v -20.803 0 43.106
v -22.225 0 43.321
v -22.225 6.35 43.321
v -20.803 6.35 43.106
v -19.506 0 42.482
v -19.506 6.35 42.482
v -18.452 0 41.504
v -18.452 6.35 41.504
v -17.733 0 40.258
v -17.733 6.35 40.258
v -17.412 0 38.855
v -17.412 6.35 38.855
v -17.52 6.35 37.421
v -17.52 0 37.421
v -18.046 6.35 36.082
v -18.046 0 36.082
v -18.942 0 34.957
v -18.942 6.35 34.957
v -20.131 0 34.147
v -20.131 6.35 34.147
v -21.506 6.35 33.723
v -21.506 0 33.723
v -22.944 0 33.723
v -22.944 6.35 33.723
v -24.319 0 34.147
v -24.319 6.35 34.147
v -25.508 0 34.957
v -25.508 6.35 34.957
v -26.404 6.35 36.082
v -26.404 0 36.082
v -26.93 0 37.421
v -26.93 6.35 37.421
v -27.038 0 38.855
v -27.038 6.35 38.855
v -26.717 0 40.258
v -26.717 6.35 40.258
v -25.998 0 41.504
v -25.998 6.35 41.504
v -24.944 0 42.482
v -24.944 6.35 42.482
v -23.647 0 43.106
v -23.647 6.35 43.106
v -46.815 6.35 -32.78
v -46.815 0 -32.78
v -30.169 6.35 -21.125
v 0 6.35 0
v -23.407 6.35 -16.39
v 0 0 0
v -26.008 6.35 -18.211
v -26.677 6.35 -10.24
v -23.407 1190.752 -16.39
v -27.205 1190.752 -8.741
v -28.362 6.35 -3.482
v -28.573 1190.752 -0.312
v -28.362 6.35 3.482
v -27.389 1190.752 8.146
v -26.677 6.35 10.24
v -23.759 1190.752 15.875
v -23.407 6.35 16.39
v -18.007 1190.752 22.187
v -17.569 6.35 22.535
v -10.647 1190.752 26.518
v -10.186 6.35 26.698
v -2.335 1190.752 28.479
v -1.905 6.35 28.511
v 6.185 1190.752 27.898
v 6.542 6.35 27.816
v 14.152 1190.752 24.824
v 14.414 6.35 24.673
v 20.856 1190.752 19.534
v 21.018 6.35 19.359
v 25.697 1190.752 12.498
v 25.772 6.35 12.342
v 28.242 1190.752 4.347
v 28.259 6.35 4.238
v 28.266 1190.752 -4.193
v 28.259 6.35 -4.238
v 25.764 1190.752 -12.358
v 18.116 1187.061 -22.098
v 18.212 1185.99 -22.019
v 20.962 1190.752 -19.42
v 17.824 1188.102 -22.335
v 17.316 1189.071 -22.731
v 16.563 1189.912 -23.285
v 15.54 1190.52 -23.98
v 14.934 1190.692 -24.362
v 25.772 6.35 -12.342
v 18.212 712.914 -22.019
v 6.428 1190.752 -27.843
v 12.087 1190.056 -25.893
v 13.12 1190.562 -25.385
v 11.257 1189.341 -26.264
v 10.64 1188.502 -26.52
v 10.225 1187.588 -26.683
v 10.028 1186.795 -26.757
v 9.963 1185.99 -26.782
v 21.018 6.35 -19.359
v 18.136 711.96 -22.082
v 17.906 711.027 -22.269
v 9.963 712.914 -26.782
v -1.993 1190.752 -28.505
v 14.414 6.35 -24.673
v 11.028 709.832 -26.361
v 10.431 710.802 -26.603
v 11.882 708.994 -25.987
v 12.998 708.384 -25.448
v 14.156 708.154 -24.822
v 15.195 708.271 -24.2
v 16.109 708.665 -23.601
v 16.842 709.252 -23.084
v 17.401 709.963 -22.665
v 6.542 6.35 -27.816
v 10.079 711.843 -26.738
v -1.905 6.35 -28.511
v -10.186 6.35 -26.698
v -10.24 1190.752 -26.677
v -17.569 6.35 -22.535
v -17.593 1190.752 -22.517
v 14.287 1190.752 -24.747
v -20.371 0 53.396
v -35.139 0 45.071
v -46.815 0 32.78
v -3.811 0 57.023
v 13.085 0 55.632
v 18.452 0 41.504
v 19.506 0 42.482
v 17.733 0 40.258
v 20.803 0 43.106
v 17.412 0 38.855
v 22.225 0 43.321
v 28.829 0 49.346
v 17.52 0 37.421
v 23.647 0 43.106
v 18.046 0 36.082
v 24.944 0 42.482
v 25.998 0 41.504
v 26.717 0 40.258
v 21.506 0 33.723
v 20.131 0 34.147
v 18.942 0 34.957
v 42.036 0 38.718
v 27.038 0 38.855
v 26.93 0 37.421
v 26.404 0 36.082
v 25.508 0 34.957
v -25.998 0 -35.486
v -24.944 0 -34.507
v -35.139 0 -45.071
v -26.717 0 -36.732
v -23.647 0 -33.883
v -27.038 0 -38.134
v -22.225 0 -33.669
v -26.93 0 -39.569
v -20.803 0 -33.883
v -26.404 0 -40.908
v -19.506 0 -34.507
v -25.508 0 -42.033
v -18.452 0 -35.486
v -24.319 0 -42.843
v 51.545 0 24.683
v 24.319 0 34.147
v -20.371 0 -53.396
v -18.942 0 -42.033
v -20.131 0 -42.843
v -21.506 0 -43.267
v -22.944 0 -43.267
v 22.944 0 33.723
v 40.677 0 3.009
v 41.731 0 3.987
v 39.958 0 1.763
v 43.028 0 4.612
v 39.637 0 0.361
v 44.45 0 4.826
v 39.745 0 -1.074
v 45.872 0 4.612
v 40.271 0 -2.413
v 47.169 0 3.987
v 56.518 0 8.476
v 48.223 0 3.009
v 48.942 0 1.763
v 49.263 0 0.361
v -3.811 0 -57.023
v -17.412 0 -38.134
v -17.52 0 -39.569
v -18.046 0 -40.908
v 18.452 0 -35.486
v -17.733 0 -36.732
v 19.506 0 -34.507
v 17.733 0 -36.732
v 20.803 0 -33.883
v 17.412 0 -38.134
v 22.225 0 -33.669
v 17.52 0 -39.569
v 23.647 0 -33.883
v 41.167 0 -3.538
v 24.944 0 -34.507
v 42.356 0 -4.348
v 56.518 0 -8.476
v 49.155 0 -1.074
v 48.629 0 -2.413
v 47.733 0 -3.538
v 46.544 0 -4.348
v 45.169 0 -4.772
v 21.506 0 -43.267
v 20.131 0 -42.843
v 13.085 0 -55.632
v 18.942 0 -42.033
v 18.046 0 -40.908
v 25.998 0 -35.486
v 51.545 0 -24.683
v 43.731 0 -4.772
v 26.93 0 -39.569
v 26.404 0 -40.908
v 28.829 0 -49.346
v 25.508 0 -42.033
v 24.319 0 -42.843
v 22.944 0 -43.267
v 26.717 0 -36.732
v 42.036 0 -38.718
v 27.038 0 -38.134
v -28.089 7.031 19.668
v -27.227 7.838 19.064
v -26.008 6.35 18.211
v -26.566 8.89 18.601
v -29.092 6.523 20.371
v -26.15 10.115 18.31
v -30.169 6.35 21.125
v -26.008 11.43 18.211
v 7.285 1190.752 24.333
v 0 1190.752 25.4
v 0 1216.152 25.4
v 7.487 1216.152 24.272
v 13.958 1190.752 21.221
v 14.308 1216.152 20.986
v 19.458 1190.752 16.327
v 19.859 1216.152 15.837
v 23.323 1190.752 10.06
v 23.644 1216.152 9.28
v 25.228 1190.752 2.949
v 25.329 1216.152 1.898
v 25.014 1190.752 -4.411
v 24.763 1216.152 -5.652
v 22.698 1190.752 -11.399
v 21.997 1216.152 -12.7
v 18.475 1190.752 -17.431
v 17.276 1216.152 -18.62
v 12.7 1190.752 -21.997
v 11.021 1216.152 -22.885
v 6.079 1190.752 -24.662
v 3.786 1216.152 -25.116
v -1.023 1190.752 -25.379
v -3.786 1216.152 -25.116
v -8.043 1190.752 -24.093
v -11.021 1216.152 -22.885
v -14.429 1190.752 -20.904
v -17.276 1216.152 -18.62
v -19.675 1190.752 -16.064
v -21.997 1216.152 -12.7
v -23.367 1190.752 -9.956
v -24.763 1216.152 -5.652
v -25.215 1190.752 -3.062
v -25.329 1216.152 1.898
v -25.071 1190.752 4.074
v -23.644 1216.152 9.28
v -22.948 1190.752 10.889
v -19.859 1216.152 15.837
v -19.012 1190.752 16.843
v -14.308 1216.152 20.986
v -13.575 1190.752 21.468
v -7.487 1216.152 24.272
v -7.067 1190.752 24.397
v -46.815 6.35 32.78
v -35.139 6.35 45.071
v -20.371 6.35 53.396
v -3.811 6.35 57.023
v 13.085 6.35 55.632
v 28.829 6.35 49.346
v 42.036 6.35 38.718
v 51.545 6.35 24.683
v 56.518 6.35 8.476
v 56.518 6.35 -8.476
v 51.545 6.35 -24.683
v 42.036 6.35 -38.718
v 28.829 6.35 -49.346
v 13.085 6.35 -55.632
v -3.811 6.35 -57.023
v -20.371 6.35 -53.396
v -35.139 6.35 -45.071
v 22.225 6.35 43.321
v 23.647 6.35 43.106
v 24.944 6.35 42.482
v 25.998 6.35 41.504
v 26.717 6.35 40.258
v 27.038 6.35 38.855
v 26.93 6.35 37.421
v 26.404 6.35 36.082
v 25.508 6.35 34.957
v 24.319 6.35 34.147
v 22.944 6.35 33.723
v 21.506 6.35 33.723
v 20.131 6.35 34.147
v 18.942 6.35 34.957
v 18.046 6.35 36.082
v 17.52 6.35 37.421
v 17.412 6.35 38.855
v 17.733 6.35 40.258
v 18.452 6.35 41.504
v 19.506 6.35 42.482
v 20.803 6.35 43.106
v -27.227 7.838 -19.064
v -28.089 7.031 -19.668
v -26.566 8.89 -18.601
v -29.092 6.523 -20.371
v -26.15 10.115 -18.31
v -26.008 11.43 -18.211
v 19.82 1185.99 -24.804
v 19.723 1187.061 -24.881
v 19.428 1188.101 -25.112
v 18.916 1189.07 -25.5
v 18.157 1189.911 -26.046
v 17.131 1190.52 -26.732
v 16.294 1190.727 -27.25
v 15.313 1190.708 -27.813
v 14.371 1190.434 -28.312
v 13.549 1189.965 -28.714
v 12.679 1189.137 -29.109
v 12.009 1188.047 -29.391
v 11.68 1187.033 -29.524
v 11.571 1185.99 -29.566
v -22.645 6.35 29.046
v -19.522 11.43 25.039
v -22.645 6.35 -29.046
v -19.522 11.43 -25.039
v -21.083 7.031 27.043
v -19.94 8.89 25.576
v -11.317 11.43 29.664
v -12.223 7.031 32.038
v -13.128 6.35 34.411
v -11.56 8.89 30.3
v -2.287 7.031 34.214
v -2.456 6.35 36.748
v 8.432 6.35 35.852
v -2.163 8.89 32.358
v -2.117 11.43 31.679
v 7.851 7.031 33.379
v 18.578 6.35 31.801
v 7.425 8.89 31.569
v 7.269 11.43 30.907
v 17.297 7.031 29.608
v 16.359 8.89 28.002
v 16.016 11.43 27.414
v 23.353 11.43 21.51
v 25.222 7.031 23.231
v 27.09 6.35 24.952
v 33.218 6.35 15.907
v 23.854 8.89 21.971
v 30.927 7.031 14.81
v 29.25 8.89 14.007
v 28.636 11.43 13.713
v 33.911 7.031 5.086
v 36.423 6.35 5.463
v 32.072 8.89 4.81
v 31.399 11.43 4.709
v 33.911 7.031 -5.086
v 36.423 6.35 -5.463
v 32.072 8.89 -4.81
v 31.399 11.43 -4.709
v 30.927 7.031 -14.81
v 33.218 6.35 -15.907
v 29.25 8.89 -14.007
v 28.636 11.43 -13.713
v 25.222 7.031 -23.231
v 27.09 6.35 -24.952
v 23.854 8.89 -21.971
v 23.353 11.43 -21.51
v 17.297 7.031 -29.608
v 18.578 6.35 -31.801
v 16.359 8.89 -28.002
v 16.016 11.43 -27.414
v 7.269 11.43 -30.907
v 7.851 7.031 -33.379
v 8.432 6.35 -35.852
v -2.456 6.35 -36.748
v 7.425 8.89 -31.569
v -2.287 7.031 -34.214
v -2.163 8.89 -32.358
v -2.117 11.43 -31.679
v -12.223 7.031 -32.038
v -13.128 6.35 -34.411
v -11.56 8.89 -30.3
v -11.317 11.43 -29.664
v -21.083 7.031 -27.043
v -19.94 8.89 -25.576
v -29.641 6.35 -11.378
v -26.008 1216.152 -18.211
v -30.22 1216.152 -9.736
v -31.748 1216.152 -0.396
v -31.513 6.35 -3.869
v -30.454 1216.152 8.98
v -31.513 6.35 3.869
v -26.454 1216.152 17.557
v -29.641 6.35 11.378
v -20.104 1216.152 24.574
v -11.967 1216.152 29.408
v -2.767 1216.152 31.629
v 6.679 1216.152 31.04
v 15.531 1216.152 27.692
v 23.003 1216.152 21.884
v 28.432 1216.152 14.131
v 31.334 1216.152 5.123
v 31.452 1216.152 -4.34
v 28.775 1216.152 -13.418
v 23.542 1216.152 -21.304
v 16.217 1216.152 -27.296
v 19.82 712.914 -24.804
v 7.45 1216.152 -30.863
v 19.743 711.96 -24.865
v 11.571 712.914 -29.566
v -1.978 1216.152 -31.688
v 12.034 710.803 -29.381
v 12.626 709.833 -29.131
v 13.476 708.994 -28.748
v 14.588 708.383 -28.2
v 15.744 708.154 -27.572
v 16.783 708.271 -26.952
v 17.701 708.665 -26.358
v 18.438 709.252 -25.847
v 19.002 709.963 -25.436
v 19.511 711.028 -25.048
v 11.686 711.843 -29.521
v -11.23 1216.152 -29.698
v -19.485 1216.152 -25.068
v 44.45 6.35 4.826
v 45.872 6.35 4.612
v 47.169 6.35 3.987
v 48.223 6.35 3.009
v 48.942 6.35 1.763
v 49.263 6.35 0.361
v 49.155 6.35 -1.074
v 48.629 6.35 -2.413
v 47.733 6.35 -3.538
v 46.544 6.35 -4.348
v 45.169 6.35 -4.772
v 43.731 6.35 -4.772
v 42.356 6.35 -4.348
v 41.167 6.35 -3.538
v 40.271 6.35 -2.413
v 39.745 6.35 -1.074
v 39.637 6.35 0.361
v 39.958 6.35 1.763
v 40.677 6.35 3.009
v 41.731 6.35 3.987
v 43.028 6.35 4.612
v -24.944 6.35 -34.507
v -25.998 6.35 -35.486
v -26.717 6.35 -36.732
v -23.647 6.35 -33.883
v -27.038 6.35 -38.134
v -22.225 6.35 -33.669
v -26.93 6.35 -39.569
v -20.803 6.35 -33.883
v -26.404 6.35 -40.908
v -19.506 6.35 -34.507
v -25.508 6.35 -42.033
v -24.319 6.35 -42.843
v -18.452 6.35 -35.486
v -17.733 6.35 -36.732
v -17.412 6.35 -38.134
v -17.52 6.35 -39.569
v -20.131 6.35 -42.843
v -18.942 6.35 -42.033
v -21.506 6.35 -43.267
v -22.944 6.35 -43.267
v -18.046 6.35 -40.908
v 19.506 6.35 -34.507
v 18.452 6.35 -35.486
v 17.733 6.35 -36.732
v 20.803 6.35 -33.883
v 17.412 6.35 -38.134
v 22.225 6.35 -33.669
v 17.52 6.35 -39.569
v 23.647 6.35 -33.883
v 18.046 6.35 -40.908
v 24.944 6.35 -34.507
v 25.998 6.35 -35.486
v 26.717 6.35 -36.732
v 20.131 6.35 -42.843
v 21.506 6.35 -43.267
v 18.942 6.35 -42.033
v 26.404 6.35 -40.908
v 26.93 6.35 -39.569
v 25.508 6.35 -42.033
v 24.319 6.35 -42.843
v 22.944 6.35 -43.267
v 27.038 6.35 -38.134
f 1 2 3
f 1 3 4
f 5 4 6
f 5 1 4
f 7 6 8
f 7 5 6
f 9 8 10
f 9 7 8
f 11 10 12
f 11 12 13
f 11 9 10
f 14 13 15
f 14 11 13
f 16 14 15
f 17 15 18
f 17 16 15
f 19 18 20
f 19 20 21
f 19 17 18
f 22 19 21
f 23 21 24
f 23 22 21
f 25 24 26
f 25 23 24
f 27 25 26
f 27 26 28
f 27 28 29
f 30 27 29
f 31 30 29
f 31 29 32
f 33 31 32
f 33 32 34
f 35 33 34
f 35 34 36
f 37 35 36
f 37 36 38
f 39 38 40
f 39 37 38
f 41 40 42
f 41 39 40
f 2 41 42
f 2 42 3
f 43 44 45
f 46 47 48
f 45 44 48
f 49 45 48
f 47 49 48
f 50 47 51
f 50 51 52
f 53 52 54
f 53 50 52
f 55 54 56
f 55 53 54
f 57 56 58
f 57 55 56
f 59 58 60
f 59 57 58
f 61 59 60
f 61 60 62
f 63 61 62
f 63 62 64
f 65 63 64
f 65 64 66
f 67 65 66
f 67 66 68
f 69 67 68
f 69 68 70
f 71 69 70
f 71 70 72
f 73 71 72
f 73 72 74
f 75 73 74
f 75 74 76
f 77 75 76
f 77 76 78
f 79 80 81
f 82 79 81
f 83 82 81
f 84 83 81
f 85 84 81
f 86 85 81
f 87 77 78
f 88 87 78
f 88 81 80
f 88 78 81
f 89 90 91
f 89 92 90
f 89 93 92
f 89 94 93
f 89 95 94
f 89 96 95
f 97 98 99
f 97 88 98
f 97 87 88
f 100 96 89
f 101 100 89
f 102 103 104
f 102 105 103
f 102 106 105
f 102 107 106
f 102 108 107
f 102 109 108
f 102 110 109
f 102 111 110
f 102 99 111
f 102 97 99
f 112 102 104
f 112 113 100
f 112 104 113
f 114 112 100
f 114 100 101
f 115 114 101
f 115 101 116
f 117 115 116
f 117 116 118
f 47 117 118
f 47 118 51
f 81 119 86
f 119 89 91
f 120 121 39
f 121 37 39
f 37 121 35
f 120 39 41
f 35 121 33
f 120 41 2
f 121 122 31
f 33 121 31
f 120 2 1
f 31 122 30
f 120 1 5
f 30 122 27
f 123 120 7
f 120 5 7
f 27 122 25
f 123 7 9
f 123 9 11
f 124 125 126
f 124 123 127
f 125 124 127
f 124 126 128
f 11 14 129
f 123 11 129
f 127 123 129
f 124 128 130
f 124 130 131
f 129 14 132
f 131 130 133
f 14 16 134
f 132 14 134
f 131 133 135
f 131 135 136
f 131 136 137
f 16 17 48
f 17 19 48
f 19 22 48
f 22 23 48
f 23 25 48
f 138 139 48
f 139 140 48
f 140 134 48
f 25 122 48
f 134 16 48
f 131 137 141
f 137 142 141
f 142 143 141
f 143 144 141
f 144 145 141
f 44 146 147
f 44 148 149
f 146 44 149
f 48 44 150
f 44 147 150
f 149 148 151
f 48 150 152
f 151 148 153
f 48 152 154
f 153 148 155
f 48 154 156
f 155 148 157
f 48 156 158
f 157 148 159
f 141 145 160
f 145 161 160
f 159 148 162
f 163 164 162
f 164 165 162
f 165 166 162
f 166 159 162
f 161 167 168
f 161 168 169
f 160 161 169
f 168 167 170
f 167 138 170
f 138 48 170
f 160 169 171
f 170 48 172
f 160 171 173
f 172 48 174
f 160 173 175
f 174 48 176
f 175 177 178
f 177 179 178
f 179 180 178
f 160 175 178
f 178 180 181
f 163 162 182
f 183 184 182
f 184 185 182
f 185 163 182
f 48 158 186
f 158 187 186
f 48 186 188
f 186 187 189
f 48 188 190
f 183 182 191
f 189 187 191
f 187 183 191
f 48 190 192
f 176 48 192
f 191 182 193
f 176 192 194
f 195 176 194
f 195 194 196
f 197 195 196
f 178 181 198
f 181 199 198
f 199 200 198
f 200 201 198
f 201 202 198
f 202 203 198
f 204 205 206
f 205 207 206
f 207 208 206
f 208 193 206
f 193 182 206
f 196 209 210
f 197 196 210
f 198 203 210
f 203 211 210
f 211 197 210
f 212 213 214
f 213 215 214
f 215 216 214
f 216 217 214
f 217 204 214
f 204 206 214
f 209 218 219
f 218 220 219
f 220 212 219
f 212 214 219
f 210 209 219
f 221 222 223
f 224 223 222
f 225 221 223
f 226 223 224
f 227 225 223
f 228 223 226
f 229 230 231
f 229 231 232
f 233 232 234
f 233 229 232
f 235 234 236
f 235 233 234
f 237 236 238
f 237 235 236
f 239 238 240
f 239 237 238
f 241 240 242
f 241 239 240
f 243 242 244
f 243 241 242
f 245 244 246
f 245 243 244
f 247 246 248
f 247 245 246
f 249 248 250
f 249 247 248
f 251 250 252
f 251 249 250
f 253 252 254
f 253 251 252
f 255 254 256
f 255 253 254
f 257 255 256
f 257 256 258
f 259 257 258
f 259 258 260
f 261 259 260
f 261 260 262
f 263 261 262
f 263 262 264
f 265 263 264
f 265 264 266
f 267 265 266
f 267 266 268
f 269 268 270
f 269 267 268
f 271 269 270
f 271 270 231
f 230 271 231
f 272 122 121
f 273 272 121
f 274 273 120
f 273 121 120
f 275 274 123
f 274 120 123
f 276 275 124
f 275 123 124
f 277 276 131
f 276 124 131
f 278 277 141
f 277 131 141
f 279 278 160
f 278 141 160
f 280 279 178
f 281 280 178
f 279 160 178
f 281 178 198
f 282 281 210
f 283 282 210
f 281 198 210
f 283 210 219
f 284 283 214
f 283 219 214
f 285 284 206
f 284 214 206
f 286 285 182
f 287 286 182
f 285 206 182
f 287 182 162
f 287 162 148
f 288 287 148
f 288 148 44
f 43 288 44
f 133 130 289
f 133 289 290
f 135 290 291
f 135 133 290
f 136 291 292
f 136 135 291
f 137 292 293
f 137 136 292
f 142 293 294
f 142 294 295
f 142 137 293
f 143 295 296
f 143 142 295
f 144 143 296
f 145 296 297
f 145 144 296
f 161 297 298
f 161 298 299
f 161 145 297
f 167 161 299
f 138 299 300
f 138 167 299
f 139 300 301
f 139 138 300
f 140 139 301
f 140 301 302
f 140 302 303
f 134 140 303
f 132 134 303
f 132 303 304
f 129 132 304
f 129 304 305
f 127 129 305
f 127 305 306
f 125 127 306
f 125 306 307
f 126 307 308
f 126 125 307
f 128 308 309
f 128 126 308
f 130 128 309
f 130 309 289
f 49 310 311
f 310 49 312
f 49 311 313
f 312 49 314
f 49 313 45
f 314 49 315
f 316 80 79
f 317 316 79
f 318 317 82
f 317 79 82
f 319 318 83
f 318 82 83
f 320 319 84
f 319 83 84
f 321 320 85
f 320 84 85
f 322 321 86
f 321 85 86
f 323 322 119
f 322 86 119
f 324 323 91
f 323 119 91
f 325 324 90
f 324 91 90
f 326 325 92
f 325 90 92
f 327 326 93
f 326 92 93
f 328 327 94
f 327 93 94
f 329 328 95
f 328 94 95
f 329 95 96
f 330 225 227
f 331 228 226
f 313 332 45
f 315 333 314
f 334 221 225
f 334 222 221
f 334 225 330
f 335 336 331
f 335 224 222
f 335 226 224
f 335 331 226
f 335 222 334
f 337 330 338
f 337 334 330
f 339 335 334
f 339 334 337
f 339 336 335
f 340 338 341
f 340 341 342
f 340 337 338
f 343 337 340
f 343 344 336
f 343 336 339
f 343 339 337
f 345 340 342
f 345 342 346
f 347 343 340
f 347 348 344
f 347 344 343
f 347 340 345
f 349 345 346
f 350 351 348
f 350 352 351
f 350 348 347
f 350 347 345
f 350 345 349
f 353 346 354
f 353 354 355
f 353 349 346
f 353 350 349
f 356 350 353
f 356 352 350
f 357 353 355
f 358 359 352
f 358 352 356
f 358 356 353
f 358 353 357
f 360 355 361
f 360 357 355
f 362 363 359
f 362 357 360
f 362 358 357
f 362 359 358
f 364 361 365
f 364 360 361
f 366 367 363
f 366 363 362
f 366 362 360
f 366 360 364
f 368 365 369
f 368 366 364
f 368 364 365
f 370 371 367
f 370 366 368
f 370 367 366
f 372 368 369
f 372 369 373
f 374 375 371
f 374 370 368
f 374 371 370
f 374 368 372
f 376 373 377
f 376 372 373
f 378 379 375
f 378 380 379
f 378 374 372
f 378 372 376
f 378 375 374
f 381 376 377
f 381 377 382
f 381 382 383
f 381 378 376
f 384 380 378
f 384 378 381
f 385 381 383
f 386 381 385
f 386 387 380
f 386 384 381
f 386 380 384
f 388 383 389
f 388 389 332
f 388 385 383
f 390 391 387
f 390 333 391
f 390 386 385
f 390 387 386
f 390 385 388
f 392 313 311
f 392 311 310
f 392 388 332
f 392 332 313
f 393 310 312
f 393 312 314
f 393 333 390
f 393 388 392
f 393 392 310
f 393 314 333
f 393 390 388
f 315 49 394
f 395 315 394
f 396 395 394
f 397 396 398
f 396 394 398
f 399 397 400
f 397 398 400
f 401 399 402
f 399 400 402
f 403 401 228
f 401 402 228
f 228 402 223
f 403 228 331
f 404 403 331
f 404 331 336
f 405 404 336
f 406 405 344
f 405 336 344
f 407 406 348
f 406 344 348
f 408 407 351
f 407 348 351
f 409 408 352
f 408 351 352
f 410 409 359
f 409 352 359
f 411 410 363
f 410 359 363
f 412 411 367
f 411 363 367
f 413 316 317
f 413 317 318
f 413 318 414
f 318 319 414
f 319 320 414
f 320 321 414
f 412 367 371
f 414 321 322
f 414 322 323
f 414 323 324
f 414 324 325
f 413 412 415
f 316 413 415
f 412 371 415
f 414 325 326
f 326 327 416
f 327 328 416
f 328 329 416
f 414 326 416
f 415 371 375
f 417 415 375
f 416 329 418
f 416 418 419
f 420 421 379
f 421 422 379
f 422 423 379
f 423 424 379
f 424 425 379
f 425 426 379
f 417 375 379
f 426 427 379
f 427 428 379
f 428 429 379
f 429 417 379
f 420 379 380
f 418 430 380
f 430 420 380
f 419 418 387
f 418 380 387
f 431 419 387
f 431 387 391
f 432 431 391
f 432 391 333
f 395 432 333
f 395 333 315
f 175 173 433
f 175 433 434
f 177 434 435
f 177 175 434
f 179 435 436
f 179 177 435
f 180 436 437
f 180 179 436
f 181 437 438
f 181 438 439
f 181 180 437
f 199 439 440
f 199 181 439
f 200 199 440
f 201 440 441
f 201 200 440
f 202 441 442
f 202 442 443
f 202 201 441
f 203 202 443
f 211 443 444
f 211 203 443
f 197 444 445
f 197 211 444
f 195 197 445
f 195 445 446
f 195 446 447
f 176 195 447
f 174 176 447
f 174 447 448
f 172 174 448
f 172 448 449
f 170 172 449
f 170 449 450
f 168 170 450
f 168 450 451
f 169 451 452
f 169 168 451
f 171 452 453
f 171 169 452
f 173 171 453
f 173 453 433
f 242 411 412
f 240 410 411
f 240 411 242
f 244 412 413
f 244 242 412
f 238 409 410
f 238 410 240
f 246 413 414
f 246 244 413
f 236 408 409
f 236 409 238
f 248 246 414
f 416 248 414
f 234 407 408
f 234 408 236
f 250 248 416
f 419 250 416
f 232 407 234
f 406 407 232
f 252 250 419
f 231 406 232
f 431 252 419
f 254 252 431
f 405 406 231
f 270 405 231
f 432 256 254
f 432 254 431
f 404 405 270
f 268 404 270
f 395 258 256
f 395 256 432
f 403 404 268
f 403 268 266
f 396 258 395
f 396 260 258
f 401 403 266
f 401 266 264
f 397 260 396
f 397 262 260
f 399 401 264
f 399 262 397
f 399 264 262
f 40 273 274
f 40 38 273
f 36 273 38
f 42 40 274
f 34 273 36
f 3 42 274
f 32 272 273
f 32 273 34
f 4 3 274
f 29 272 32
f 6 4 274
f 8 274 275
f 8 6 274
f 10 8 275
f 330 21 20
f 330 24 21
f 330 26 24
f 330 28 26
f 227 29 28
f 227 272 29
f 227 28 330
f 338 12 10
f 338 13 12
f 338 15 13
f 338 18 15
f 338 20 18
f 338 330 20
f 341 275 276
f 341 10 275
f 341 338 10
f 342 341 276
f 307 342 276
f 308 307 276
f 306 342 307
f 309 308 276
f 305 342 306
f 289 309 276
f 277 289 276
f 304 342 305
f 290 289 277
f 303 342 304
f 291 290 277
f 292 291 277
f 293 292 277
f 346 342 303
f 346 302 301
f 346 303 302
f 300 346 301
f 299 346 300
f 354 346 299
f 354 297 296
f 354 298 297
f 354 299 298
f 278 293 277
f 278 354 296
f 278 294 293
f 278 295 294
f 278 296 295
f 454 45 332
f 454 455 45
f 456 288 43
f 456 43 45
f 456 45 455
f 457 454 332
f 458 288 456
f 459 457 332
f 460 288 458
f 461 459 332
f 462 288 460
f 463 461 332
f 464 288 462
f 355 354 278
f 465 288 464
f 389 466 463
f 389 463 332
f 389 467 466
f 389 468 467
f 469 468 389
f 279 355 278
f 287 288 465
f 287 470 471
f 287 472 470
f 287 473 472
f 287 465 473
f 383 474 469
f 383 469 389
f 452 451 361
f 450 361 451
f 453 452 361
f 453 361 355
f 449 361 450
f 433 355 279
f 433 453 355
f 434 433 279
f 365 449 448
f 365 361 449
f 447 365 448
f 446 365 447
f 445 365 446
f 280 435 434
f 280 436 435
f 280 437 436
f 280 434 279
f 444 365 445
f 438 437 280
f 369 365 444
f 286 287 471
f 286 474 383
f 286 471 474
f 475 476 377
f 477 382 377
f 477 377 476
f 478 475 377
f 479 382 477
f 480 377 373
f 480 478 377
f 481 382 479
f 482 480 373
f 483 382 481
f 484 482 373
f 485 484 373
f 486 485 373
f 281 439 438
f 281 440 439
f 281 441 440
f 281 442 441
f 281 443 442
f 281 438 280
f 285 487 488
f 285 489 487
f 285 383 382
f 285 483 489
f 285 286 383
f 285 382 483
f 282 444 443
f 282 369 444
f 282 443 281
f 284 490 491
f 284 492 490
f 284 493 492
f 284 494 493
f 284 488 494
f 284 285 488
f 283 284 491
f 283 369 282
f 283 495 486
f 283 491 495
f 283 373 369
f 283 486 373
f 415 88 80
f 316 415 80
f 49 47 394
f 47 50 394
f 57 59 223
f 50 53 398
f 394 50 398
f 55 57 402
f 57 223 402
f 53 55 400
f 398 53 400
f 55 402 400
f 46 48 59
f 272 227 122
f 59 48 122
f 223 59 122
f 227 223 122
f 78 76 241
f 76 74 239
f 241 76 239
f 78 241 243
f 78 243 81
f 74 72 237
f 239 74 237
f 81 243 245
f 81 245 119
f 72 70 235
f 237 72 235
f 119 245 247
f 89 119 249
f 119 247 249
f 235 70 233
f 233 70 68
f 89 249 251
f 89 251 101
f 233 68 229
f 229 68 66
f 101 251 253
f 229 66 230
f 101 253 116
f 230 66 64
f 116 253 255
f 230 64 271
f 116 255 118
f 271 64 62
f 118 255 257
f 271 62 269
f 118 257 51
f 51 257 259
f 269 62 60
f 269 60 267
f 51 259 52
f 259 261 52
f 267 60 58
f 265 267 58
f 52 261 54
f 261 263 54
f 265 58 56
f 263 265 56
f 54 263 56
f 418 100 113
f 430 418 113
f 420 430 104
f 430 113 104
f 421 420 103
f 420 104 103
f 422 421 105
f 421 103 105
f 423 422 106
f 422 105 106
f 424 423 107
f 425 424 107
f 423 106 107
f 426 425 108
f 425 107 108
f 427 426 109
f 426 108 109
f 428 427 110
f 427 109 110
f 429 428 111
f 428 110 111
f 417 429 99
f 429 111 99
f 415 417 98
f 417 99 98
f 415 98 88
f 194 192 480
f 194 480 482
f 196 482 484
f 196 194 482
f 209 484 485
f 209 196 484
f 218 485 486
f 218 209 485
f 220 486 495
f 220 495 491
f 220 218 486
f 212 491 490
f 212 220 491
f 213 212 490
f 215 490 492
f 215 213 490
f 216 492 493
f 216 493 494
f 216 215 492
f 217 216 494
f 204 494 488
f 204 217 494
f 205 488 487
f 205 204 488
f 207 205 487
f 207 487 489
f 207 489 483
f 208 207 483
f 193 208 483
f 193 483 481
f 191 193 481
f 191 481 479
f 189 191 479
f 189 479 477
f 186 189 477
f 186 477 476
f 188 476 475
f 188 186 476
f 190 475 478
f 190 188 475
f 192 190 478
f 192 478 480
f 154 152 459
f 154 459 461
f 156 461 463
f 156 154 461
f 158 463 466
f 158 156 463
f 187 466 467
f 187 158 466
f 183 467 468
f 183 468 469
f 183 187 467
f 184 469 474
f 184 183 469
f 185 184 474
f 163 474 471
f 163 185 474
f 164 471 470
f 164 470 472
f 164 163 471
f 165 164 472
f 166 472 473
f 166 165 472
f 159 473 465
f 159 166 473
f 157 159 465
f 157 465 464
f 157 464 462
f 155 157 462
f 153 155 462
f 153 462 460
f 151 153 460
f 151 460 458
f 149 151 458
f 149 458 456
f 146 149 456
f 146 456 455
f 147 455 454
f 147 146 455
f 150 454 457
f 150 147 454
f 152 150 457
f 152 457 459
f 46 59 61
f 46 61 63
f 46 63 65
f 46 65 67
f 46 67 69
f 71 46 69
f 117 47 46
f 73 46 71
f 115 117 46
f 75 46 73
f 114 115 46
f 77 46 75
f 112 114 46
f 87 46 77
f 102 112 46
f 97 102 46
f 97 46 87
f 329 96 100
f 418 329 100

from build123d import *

# Parameters (mm, degrees)
SKETCH1_R               = 4.826
BOSS_EXTRUDE1_DEPTH     = 6.35
SKETCH2_R               = 31.75
SKETCH2_R_2             = 28.575
BOSS_EXTRUDE2_DEPTH     = 1209.802
BOSS_EXTRUDE3_START     = -25.4
SKETCH3_R               = 28.575
SKETCH3_R_2             = 25.4
BOSS_EXTRUDE3_DEPTH     = 25.4
CUT_EXTRUDE1_DEPTH      = 6.35
CUT_EXTRUDE1_DEPTH_BACK = 6.35
FILLET1_ANGLE           = 290


with BuildPart() as part:
    # Sketch1 → Boss-Extrude1 (new body)
    with BuildSketch(Plane(origin=(0, 0, 0), x_dir=(1, 0, 0), z_dir=(0, 1, 0))):
        with BuildLine():
            Line((-46.814539331, 32.779893337), (0, 0))
            Line((0, 0), (-46.814539331, -32.779893337))
            ThreePointArc((-46.814539331, -32.779893337), (57.15, 0), (-46.814539331, 32.779893337))
        make_face()
        with Locations(Location((44.45, 0, 0), (0, 0, 270))):
            Circle(SKETCH1_R, mode=Mode.SUBTRACT)
        with Locations(Location((22.225, -38.494829198, 0), (0, 0, 270))):
            Circle(SKETCH1_R, mode=Mode.SUBTRACT)
        with Locations(Location((-22.225, -38.494829198, 0), (0, 0, 270))):
            Circle(SKETCH1_R, mode=Mode.SUBTRACT)
        with Locations(Location((-22.225, 38.494829198, 0), (0, 0, 270))):
            Circle(SKETCH1_R, mode=Mode.SUBTRACT)
        with Locations(Location((22.225, 38.494829198, 0), (0, 0, 270))):
            Circle(SKETCH1_R, mode=Mode.SUBTRACT)
    extrude(amount=BOSS_EXTRUDE1_DEPTH)

    # Sketch2 → Boss-Extrude2 (add)
    with BuildSketch(Plane(origin=(0, 6.35, 0), x_dir=(1, 0, 0), z_dir=(0, 1, 0))):
        with Locations(Location((0, 0, 0), (0, 0, 145))):
            Circle(SKETCH2_R)
        with Locations(Location((0, 0, 0), (0, 0, 145))):
            Circle(SKETCH2_R_2, mode=Mode.SUBTRACT)
    extrude(amount=BOSS_EXTRUDE2_DEPTH)

    # Sketch3 → Boss-Extrude3 (add)
    with BuildSketch(Plane(origin=(0, 1216.152, 0), x_dir=(1, 0, 0), z_dir=(0, 1, 0)).offset(BOSS_EXTRUDE3_START)):
        with Locations(Location((0, 0, 0), (0, 0, 145))):
            Circle(SKETCH3_R)
        with Locations(Location((0, 0, 0), (0, 0, 270))):
            Circle(SKETCH3_R_2, mode=Mode.SUBTRACT)
    extrude(amount=BOSS_EXTRUDE3_DEPTH)

    # Sketch4 → Cut-Extrude1 (cut, two sides: drawn at the far end of the back side and taken through both)
    with BuildSketch(Plane(origin=(13.5255, 0, -23.426853198), x_dir=(-0.8660254037844382, 0, -0.5000000000000009), z_dir=(0.5000000000000009, 0, -0.8660254037844382)).offset(-CUT_EXTRUDE1_DEPTH_BACK)):
        with BuildLine():
            Line((4.7625, 1185.9895), (4.7625, 712.9145))
            ThreePointArc((4.7625, 712.9145), (0, 708.152), (-4.7625, 712.9145))
            Line((-4.7625, 712.9145), (-4.7625, 1185.9895))
            ThreePointArc((-4.7625, 1185.9895), (0, 1190.752), (4.7625, 1185.9895))
        make_face()
    extrude(amount=CUT_EXTRUDE1_DEPTH + CUT_EXTRUDE1_DEPTH_BACK, mode=Mode.SUBTRACT)

    # Fillet1: read off the stored shape, not the designer's step
    # Fillet1 outline → Fillet1 (revolve)
    with BuildSketch(Plane(origin=(0, 0, 0), x_dir=(-0.8191520442889906, 0, 0.5735764363510478), z_dir=(-0.5735764363510478, 0, -0.8191520442889906))):
        with BuildLine():
            ThreePointArc((36.83, 6.35), (33.237897552, 7.837897552), (31.75, 11.43))
            Line((31.75, 11.43), (31.75, 6.35))
            Line((31.75, 6.35), (36.83, 6.35))
        make_face()
    revolve(axis=Axis((0, 0, 0), (0, 1, 0)), revolution_arc=FILLET1_ANGLE)


solid = part.part
